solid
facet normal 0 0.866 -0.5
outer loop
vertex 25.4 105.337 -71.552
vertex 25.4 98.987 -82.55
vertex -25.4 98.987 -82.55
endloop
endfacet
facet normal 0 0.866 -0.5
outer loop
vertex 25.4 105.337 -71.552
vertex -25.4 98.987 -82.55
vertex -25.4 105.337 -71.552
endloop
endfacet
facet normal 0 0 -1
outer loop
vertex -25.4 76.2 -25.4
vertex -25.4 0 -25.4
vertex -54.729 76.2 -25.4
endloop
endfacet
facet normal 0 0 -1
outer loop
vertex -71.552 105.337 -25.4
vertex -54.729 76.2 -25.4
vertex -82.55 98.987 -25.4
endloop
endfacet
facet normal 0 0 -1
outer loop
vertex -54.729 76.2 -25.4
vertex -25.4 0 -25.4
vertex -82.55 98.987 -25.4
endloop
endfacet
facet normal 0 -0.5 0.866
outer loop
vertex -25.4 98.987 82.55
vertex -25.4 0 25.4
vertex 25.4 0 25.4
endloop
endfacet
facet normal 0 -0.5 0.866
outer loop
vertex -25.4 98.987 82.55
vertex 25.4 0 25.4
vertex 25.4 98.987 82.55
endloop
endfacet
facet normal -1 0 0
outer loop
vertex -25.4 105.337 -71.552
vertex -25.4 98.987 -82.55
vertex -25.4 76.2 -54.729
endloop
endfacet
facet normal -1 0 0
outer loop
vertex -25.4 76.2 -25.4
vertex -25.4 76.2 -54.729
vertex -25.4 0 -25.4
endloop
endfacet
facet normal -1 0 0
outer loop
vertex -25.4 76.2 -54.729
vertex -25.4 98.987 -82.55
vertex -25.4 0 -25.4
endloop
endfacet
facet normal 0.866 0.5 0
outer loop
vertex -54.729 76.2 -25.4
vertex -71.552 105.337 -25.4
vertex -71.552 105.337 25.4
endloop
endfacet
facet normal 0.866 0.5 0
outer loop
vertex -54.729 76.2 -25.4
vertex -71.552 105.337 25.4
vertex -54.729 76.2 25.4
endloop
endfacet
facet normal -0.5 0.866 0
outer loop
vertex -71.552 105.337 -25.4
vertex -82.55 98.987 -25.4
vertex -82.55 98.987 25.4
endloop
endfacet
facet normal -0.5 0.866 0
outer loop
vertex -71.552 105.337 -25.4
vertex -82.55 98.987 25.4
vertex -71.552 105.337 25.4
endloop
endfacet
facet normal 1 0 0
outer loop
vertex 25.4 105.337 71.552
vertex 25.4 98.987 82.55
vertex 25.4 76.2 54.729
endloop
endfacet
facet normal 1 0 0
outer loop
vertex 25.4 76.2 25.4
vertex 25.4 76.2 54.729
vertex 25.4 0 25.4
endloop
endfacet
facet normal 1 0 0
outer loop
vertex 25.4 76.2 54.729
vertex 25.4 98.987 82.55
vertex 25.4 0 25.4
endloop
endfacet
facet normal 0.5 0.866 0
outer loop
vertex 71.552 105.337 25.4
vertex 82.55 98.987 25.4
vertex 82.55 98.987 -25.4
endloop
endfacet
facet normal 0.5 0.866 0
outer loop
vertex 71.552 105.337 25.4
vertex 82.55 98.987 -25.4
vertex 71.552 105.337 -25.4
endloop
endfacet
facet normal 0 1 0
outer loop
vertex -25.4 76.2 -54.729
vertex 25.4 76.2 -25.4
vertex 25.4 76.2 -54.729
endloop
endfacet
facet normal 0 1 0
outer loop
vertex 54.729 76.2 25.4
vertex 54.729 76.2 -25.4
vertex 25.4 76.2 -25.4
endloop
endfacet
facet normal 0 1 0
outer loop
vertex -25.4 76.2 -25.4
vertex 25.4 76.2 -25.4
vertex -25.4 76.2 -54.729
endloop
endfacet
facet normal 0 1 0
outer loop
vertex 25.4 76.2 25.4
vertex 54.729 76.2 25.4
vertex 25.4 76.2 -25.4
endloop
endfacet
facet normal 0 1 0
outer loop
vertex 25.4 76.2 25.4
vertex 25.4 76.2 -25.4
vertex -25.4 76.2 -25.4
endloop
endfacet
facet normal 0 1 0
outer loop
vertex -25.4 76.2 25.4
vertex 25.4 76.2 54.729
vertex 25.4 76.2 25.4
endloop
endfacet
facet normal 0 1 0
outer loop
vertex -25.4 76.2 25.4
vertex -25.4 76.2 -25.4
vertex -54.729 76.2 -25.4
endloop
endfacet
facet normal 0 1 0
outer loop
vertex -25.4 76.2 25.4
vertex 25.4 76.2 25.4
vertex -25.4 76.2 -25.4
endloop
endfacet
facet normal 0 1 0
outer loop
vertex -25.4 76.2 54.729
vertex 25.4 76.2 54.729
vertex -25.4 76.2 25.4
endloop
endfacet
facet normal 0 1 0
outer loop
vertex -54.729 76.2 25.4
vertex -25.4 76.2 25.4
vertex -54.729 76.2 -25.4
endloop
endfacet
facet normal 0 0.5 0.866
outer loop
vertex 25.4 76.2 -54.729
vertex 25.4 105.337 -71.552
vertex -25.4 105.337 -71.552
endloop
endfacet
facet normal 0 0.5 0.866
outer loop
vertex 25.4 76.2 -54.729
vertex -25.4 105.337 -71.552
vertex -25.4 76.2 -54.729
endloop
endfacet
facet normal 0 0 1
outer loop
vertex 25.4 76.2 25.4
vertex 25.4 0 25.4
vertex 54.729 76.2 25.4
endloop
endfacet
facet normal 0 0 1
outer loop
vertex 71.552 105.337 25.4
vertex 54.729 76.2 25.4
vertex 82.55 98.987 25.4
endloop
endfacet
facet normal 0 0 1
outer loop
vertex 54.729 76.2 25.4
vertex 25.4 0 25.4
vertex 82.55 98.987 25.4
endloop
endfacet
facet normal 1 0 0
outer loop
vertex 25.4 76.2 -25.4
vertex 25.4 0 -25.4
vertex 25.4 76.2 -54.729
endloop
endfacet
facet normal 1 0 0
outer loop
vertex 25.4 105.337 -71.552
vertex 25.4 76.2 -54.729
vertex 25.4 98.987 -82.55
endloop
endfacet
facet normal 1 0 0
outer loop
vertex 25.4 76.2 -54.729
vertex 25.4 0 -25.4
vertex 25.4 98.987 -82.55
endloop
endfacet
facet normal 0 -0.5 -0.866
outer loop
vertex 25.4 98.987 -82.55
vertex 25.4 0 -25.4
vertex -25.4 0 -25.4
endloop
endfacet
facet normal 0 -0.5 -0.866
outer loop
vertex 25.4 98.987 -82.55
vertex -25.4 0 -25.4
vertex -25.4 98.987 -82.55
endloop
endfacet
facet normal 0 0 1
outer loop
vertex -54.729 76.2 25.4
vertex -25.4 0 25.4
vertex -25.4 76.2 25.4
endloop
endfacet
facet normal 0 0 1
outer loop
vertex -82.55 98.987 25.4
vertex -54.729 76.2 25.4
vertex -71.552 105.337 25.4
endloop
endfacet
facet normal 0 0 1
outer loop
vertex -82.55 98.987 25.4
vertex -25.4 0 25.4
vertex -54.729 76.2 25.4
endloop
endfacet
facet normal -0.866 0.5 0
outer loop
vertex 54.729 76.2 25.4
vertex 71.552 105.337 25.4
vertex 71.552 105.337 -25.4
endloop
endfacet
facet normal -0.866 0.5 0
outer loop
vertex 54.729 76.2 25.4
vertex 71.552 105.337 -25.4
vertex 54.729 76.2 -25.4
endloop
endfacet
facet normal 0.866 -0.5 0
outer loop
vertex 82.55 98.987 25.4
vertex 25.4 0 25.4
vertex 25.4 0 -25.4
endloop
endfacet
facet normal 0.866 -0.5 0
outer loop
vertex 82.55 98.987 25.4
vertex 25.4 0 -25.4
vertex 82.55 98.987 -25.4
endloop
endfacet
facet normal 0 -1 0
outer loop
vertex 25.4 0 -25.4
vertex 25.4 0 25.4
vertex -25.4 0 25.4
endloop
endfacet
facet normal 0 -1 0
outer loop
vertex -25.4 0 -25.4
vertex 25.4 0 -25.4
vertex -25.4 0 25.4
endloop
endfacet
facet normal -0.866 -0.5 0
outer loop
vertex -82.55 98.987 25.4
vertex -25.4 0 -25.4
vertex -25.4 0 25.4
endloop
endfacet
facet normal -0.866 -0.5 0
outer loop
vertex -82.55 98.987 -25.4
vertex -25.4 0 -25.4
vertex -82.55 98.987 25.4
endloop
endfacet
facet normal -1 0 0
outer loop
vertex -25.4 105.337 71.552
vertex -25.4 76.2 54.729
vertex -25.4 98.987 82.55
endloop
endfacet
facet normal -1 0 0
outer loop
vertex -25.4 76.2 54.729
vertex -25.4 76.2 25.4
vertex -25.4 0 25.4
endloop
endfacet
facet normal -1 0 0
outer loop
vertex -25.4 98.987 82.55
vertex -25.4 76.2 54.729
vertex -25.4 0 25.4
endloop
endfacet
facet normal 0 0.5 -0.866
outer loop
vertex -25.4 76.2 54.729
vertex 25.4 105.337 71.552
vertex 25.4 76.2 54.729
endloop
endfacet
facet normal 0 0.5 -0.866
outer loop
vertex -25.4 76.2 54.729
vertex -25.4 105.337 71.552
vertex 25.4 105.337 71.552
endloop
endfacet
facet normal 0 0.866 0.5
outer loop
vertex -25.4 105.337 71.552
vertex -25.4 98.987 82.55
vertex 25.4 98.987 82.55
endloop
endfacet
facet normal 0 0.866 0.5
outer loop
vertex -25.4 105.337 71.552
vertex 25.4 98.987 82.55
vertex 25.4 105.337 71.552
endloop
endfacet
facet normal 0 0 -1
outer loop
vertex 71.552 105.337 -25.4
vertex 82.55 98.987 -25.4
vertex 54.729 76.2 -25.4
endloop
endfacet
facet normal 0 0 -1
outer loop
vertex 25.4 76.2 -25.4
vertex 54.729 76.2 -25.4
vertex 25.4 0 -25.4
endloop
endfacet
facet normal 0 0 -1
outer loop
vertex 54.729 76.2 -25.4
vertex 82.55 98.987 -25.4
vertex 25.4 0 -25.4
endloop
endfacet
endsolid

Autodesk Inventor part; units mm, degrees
ref_plane "YZ Plane" through (0, 0, 0) normal (1, 0, 0) x (0, 1, 0)
ref_plane "XZ Plane" through (0, 0, 0) normal (0, 1, 0) x (-1, 0, 0)
ref_plane "XY Plane" through (0, 0, 0) normal (0, 0, 1) x (1, 0, 0)
sketch "Sketch1" plane through (0, 0, 0) normal (0, 1, 0) x (-1, 0, 0)
  circle A0 centre (0, 0) radius 25.4 construction
  line L0 (-25.4, -25.4) -> (25.4, -25.4)
  line L1 (25.4, -25.4) -> (25.4, 25.4)
  line L2 (25.4, 25.4) -> (-25.4, 25.4)
  line L3 (-25.4, 25.4) -> (-25.4, -25.4)
  line L4 (-25.4, -25.4) -> (25.4, 25.4) construction
  line L5 (25.4, -25.4) -> (-25.4, 25.4) construction
  dimension "d0" = 50.8
  dimension "d1" = 50.8
extrude "Extrusion1" add sketch "Sketch1" along normal blind 76.2
sketch "Sketch3" plane through (0, 0, 0) normal (1, 0, 0) x (0, 1, 0)
  line L0 (-43.9941, 0) -> (0, 25.4) construction
  line L1 (0, -25.4) -> (0, 25.4) construction
  line L2 (76.2, 25.4) -> (0, 25.4) construction
  line L3 (0, 25.4) -> (0, 0) construction
  line L4 (-43.9941, 0) -> (0, 0) construction
  line L5 (-43.9941, 0) -> (0, -25.4) construction
  line L6 (98.9867, 82.55) -> (105.3367, 71.5515)
  line L7 (105.3367, 71.5515) -> (76.2, 54.7294)
  line L8 (76.2, 54.7294) -> (76.2, 25.4)
  line L9 (0, 25.4) -> (98.9867, 82.55)
  line L10 (0, 25.4) -> (76.2, 25.4)
  dimension "d14" = 60
  dimension "d15" = 12.7
  dimension "d16" = 114.3
extrude "Extrusion2" add sketch "Sketch3" along normal mid plane 50.8
pattern_circular "Circular Pattern1" count 4 over 360 about axis through (0, -10, 0) along (0, 1, 0) of "Extrusion2"
properties part number "4-Tool_Head"
